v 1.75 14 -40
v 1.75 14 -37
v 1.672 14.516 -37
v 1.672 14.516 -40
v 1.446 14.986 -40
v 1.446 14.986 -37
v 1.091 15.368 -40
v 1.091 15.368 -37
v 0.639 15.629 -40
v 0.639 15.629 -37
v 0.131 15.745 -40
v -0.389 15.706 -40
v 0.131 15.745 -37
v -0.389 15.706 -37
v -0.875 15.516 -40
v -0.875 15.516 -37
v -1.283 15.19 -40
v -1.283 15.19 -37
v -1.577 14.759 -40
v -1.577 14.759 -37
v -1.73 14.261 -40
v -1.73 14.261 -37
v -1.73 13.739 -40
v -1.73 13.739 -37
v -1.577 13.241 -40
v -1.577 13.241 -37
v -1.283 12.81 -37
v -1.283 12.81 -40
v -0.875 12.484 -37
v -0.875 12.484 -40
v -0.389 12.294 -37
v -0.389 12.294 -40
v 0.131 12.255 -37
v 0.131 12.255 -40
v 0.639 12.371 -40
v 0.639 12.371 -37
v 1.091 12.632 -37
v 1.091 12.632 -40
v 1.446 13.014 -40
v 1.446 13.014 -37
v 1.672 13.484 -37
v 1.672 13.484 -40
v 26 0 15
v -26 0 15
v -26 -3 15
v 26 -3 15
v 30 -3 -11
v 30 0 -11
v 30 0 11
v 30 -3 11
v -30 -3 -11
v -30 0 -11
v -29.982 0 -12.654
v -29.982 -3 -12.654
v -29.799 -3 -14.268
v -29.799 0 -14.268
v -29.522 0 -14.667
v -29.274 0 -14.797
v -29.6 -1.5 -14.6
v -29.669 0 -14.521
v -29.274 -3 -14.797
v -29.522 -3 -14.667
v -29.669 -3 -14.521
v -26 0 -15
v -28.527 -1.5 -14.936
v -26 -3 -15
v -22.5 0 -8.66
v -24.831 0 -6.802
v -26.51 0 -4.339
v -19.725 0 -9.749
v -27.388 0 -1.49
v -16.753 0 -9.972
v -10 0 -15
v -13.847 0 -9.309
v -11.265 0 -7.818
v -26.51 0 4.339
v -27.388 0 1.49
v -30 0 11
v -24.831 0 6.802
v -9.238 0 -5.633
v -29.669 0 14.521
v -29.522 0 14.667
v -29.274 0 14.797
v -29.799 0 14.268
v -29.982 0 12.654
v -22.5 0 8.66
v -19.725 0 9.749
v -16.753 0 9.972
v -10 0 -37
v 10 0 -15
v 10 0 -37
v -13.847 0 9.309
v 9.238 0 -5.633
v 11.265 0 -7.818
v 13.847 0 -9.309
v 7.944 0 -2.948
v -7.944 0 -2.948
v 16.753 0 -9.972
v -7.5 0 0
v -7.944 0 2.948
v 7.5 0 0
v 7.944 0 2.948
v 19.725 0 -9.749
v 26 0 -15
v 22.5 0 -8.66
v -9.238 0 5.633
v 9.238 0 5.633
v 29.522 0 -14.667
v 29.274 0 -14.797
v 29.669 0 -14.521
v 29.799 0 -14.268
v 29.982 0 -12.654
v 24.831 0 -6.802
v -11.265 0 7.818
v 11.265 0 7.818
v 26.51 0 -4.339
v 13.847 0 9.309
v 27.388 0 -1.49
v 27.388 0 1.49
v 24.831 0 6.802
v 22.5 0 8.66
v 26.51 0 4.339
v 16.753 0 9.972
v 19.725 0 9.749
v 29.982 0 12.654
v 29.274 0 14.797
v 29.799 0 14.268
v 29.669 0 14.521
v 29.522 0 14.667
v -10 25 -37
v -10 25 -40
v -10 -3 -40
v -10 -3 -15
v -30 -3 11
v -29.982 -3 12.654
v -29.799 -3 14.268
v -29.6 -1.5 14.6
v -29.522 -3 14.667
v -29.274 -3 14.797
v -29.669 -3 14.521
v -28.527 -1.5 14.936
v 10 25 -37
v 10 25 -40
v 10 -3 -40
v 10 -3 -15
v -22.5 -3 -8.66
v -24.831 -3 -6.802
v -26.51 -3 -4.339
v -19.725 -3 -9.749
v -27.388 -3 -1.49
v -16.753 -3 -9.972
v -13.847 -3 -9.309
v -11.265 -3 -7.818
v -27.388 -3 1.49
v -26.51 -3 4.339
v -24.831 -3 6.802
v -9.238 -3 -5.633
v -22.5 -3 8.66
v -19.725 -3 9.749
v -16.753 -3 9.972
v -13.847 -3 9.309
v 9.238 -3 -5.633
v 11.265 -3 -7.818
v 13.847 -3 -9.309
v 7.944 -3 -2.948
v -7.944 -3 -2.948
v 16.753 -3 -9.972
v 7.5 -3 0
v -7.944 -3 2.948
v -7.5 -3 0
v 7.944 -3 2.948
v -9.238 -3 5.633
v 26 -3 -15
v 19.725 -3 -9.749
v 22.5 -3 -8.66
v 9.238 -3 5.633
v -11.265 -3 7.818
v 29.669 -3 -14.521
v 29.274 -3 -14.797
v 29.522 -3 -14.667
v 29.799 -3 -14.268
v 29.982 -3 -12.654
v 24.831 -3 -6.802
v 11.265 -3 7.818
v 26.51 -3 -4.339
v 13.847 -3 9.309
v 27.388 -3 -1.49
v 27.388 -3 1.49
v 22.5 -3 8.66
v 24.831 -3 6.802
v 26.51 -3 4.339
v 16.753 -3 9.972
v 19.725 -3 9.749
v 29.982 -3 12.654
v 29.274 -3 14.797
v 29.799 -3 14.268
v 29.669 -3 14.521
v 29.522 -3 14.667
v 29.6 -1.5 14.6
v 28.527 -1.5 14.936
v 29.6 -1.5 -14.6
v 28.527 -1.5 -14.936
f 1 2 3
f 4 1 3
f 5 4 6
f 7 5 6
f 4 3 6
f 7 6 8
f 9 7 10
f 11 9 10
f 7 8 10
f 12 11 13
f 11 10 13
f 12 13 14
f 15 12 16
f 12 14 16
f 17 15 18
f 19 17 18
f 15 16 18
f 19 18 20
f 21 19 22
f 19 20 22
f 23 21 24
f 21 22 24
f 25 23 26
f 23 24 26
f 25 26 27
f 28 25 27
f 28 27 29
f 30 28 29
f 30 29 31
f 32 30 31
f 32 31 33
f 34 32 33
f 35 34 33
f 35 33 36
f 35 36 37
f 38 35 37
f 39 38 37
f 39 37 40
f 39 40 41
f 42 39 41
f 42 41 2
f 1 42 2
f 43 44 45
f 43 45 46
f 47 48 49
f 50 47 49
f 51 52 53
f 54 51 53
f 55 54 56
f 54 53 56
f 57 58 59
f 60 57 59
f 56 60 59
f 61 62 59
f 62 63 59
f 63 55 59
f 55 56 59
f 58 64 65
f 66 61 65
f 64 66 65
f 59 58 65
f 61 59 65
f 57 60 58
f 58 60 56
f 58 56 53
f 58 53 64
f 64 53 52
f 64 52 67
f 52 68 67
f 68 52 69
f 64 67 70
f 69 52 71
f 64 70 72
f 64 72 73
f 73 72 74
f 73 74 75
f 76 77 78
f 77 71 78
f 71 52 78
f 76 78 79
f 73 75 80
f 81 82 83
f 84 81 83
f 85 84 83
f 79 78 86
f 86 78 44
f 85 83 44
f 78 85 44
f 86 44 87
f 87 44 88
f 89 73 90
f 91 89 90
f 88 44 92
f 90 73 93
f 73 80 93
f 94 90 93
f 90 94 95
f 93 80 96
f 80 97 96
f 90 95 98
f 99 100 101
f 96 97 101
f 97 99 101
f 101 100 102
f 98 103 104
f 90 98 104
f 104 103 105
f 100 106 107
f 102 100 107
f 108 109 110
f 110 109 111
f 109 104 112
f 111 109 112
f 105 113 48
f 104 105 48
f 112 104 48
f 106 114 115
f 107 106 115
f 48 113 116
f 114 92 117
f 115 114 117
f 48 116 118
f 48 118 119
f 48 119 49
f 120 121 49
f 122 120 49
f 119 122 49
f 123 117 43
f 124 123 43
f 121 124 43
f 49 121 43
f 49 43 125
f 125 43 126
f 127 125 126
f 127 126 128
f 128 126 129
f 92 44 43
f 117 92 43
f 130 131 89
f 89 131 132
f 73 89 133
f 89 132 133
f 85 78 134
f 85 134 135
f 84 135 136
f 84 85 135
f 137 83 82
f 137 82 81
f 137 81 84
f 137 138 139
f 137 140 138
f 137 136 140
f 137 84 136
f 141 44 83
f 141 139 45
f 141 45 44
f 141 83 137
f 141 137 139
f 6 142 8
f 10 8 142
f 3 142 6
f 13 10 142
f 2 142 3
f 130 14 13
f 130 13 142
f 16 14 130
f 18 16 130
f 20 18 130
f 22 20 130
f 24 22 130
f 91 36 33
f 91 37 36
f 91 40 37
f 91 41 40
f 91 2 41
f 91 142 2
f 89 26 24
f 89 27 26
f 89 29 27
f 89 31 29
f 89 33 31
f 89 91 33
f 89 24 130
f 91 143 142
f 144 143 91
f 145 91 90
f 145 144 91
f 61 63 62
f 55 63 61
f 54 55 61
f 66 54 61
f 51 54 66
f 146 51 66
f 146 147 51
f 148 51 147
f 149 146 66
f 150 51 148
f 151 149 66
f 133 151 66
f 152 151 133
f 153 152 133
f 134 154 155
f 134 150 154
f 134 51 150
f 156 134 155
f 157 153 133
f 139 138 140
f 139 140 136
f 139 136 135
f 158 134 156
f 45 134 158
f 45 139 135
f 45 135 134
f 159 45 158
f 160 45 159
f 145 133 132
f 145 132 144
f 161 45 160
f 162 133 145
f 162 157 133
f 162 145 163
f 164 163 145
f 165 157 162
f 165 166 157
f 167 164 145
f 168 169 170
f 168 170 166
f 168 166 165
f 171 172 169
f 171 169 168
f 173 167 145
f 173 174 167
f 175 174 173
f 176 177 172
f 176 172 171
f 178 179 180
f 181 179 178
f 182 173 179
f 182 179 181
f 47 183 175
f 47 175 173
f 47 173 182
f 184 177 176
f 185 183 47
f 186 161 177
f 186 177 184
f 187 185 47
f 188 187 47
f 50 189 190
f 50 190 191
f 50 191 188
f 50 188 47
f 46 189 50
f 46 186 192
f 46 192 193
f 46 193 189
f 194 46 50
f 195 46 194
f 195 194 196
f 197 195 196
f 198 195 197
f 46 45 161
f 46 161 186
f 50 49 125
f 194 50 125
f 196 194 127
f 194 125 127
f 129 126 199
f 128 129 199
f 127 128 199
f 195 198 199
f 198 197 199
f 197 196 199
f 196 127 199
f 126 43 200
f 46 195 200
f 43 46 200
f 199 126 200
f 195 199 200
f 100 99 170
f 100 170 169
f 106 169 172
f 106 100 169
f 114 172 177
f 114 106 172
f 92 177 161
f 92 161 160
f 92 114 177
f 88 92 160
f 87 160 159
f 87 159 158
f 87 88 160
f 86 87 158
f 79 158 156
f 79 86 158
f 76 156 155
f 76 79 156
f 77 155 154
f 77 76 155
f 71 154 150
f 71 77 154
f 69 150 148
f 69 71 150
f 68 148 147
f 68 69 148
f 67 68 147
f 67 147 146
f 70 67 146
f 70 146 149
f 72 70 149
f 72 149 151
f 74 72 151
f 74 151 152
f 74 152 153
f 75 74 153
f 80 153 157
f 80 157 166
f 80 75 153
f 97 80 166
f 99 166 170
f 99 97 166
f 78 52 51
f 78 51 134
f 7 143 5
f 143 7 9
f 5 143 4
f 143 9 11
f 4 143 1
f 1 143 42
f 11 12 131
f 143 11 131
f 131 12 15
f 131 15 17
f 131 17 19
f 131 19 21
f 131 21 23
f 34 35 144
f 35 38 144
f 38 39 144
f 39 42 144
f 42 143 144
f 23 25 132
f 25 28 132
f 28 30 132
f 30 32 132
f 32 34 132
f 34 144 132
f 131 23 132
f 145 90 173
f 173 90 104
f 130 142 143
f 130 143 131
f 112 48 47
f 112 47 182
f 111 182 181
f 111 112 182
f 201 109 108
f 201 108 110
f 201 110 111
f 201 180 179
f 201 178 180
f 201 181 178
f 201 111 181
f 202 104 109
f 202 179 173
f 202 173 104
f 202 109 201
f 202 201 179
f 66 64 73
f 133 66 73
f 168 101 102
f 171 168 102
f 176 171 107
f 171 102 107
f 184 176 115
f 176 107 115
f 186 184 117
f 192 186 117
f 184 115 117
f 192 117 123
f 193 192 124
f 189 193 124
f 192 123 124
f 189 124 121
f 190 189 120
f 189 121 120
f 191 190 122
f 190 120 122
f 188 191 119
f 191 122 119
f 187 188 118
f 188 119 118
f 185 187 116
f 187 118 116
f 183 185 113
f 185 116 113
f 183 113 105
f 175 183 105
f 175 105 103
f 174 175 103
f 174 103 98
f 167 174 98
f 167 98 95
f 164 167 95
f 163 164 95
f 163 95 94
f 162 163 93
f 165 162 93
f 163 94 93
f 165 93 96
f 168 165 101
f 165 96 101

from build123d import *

# Parameters (mm, degrees)
F0_W        = 60
F0_H        = 30
F0_R        = 10
F1_DEPTH    = 3
F2_T1_DEPTH = 23
F3_W        = 20
F3_H        = 3
F4_DEPTH    = 25
F5_W        = 20
F5_H        = 3
F6_DEPTH    = 25
F7_R        = 1.75
F8_DEPTH    = 3.0010001


# Not quite as in the source:
# - a fillet or chamfer that OpenCascade refuses, or shapes differently, is made with other operations: its cross-section is extruded or revolved along the edge and cut away or added


with BuildPart() as f1:
    # F0 (on Front) → F1 (new body)
    with BuildSketch(Plane.XZ):
        Rectangle(F0_W, F0_H)
        with Locations((-17.5, 0)):
            Circle(F0_R, mode=Mode.SUBTRACT)
        with BuildLine():
            ThreePointArc((27.5, 0), (17.5, -10), (7.5, 0))
            ThreePointArc((7.5, 0), (17.5, 10), (27.5, 0))
        make_face(mode=Mode.SUBTRACT)
    extrude(amount=F1_DEPTH)

    # F2: fillet of radius 4 on 4 edges, made by hand

    # F2_s2 → F2_t1 (cut)
    with BuildSketch(Plane.XZ.offset(-10)):
        with BuildLine():
            add(Edge.make_bspline(
                [(30, -11), (30, -15), (26, -15)],
                knots=[0, 0, 0, 1, 1, 1], degree=2, weights=[1, 4, 1]))
            Line((26, -15), (30, -15))
            Line((30, -15), (30, -11))
        make_face()
        with BuildLine():
            add(Edge.make_bspline(
                [(-30, -11), (-30, -15), (-26, -15)],
                knots=[0, 0, 0, 1, 1, 1], degree=2, weights=[1, 4, 1]))
            Line((-26, -15), (-30, -15))
            Line((-30, -15), (-30, -11))
        make_face()
        with BuildLine():
            add(Edge.make_bspline(
                [(30, 11), (30, 15), (26, 15)],
                knots=[0, 0, 0, 1, 1, 1], degree=2, weights=[1, 4, 1]))
            Line((26, 15), (30, 15))
            Line((30, 15), (30, 11))
        make_face()
        with BuildLine():
            add(Edge.make_bspline(
                [(-30, 11), (-30, 15), (-26, 15)],
                knots=[0, 0, 0, 1, 1, 1], degree=2, weights=[1, 4, 1]))
            Line((-26, 15), (-30, 15))
            Line((-30, 15), (-30, 11))
        make_face()
    extrude(amount=F2_T1_DEPTH, mode=Mode.SUBTRACT)

    # F3 (on face) → F4 (join)
    with BuildSketch(Plane(origin=(0, 0, -15), x_dir=(1, 0, 0), z_dir=(0, 0, -1))):
        with Locations((0, 1.5)):
            Rectangle(F3_W, F3_H)
    extrude(amount=F4_DEPTH)

    # F5 (on face) → F6 (join)
    with BuildSketch(Plane(origin=(0, 0, 0), x_dir=(-1, 0, 0), z_dir=(0, 1, 0))):
        with Locations((0, -38.5)):
            Rectangle(F5_W, F5_H)
    extrude(amount=F6_DEPTH)

    # F7 (on face) → F8 (cut, through all)
    with BuildSketch(Plane.XY.offset(-37)):
        with Locations((0, 14)):
            Circle(F7_R)
    extrude(amount=-F8_DEPTH, mode=Mode.SUBTRACT)


solid = f1.part
